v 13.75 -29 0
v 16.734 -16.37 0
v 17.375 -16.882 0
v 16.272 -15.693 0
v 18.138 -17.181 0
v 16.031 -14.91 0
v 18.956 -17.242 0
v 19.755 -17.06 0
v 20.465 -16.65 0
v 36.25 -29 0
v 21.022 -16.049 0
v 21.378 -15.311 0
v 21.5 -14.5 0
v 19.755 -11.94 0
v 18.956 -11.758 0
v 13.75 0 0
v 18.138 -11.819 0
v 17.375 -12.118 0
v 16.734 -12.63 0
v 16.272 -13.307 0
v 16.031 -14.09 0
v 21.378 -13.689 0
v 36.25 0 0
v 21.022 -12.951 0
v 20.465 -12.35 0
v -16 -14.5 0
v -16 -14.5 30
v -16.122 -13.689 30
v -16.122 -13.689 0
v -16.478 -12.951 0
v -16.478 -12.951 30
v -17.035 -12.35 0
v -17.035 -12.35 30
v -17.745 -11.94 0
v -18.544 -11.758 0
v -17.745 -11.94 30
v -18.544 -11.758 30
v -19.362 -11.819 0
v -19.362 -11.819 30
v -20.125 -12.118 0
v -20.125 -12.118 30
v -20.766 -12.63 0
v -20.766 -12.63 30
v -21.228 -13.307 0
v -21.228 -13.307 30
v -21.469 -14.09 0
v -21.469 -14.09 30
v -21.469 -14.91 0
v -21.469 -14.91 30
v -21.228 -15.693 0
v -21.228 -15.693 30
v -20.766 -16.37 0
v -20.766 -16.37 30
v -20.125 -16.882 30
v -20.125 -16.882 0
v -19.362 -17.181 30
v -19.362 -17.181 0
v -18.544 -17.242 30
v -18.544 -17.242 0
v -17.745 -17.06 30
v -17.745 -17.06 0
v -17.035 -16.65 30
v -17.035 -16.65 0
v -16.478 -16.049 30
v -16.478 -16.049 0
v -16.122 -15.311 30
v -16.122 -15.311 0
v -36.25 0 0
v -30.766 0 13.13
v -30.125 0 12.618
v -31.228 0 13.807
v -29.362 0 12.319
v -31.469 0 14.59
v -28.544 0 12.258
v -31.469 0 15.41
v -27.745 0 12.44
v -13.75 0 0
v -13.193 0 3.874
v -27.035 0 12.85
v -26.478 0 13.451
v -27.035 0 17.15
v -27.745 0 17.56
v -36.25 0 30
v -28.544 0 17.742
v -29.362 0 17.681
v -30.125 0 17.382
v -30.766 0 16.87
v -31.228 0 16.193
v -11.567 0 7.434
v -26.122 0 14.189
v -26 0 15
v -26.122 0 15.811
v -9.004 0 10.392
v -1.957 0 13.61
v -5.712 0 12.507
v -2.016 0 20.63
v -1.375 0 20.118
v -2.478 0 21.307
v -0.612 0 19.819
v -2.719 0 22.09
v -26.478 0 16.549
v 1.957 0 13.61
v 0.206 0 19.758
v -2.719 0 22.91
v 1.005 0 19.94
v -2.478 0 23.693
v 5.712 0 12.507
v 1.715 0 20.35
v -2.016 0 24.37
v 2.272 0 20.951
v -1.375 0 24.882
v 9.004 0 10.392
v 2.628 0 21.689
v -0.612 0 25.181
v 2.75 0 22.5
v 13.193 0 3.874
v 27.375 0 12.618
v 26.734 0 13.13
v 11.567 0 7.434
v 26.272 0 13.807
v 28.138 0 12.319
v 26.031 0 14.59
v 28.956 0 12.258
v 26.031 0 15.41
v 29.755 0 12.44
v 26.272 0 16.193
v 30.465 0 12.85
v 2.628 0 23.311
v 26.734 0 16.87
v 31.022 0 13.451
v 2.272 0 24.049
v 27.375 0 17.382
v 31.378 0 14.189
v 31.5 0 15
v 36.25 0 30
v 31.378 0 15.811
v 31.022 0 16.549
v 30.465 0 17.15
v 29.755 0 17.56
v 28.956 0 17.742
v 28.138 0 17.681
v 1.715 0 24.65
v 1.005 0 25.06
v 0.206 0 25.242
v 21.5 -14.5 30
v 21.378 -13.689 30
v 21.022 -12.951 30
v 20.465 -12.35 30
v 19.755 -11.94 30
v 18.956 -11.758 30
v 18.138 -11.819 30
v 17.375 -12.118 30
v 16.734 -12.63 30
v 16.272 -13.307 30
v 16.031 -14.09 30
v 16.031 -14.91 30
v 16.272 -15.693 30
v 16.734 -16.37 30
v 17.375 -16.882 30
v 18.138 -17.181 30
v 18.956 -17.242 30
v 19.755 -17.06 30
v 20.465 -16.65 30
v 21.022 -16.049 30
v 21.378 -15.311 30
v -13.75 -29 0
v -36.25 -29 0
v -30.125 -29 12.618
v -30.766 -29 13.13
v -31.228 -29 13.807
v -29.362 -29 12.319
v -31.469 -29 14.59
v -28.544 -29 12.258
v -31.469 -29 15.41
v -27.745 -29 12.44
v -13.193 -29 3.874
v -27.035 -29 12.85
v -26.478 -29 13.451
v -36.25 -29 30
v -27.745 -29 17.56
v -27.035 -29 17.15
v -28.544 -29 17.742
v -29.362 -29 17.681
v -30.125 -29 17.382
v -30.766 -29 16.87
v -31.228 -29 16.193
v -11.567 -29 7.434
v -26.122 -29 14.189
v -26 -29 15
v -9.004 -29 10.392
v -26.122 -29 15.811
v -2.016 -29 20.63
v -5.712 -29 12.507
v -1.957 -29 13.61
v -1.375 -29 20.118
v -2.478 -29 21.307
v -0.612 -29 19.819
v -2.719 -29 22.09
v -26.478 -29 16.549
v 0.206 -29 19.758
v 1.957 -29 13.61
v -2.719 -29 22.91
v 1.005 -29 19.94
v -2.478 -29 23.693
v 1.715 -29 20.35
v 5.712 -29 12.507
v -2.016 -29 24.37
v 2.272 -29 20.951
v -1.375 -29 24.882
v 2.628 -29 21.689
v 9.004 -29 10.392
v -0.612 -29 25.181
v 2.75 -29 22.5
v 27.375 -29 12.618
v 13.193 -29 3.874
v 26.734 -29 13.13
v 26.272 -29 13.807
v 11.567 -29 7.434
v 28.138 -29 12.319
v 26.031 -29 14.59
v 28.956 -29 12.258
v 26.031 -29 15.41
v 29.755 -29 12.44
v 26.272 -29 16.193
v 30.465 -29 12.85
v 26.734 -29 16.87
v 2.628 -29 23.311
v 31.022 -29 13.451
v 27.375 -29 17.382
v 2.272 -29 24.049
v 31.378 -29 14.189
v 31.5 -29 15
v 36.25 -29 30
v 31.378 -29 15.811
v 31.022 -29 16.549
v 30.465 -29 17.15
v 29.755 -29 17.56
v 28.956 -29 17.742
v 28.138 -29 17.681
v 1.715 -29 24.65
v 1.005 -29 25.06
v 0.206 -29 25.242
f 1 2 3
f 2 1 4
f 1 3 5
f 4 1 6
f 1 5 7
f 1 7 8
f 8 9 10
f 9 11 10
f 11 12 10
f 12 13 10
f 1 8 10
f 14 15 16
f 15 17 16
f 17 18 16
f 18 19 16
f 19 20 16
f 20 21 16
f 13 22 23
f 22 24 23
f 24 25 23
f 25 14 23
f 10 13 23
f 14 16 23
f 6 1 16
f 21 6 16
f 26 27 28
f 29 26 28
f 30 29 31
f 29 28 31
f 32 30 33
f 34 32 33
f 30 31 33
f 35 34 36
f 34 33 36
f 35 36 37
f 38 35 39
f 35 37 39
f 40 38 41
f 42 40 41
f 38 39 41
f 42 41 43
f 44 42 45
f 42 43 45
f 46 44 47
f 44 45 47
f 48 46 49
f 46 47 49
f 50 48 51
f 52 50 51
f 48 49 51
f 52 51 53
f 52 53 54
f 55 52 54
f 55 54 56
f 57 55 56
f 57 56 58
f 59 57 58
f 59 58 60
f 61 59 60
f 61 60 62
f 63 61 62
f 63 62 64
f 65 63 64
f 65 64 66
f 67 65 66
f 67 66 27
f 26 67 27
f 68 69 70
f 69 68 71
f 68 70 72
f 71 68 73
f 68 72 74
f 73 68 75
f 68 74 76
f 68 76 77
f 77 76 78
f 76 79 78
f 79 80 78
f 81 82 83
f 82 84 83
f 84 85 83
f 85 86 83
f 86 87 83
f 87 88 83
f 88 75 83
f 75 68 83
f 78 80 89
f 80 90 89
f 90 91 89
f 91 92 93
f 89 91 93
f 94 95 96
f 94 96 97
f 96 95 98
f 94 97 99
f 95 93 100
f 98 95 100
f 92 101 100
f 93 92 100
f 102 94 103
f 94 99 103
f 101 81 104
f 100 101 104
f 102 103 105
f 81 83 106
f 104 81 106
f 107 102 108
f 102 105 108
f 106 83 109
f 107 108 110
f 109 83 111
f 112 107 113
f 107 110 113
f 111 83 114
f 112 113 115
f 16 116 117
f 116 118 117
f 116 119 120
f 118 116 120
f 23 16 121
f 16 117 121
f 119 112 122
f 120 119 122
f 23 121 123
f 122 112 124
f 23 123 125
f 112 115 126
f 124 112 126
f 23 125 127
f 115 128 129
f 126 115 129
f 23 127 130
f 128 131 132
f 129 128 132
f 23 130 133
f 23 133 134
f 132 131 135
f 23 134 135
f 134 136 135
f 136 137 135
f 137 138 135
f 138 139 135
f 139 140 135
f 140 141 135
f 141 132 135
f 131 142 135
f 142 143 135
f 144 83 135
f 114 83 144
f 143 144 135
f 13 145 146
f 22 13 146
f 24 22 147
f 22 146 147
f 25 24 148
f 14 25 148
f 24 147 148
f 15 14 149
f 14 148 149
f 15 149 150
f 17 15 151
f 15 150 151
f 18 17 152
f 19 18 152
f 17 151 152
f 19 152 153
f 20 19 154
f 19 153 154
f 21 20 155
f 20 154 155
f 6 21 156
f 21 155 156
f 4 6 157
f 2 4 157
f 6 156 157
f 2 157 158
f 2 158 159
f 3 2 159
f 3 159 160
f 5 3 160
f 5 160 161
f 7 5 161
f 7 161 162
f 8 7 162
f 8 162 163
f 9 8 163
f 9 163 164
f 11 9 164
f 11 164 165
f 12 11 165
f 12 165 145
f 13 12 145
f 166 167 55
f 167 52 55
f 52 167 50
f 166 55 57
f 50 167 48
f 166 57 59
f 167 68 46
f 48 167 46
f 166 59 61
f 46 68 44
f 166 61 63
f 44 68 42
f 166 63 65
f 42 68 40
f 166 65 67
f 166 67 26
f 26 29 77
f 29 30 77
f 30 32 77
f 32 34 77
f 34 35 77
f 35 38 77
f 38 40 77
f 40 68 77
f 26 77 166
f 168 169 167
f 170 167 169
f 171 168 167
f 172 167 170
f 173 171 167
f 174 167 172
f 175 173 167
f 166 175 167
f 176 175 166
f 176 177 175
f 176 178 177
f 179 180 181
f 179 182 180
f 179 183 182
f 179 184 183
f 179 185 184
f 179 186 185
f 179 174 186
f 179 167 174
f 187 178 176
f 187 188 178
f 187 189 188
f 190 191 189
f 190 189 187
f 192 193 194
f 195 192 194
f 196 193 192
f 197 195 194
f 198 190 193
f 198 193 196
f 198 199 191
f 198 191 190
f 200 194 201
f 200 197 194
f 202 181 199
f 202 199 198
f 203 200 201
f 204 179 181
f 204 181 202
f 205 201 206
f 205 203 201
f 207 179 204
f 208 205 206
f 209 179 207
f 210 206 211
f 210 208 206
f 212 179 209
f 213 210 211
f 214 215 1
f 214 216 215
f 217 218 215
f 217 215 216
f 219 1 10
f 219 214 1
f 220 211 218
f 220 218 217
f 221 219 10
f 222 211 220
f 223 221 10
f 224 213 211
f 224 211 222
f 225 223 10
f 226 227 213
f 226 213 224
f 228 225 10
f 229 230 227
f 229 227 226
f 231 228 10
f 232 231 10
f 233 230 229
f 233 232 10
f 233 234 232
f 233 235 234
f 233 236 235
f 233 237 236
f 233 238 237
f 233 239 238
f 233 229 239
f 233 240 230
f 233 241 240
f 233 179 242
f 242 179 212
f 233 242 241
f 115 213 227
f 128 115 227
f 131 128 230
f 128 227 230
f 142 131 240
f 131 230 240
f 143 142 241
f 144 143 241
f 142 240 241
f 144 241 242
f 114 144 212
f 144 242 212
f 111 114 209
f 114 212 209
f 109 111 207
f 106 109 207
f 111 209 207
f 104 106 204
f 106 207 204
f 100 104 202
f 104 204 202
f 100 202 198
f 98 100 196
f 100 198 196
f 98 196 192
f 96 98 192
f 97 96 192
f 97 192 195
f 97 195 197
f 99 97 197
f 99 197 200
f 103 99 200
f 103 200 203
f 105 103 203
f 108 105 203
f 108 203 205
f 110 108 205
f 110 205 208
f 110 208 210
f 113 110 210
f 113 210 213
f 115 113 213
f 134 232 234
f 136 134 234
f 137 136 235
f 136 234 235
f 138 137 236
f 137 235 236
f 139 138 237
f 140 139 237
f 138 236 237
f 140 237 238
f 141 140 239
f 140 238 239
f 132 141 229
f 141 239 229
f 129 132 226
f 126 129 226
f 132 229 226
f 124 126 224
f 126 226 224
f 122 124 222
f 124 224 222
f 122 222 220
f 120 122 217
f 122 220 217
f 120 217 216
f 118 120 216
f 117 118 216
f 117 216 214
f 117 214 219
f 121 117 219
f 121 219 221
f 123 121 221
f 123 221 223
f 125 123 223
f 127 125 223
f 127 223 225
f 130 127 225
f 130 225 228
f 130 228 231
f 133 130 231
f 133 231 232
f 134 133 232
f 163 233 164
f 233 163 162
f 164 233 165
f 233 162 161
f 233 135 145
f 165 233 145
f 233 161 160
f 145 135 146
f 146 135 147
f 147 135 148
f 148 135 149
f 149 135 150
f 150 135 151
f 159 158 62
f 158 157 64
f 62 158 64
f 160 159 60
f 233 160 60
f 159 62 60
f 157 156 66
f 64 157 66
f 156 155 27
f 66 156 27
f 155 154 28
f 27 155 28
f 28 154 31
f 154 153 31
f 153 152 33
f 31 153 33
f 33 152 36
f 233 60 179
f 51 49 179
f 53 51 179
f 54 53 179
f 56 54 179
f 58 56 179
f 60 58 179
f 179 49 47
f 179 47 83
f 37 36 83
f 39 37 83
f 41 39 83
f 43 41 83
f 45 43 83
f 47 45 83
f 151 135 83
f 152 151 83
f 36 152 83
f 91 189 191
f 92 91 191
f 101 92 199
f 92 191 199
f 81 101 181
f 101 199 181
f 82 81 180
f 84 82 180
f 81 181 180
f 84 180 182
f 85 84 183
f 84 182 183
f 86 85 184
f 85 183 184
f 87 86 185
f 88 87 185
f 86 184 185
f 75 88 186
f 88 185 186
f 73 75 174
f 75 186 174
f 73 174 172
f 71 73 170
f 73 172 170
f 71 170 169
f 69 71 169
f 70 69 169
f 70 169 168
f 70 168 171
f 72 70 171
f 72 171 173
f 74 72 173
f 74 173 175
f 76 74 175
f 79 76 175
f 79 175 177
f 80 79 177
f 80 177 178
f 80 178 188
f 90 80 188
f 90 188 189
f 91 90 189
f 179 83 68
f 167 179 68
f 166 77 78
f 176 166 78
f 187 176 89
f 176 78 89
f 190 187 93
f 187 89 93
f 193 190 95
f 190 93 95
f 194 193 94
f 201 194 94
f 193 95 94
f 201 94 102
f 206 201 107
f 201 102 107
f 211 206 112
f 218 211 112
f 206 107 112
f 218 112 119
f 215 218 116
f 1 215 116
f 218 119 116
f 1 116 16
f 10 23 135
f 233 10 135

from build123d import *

# Parameters (mm, degrees)
F1_DEPTH = 29
F2_R     = 2.75
F3_DEPTH = 50
F4_R     = 2.75
F5_DEPTH = 50


with BuildPart() as f1:
    # F0 (on Front) → F1 (new body)
    with BuildSketch(Plane.XZ):
        with BuildLine():
            ThreePointArc((-13.75, 0), (0, 13.75), (13.75, 0))
            Line((13.75, 0), (36.25, 0))
            Line((36.25, 0), (36.25, 30))
            Line((36.25, 30), (-36.25, 30))
            Line((-36.25, 30), (-36.25, 0))
            Line((-36.25, 0), (-13.75, 0))
        make_face()
    extrude(amount=F1_DEPTH)

    # F2 (on face) → F3 (cut)
    with BuildSketch(Plane.XY.offset(30)):
        with Locations((-18.75, -14.5)):
            Circle(F2_R)
        with Locations((18.75, -14.5)):
            Circle(F2_R)
    extrude(amount=-F3_DEPTH, mode=Mode.SUBTRACT)

    # F4 (on face) → F5 (cut)
    with BuildSketch(Plane.XZ.offset(29)):
        with Locations((-28.75, 15)):
            Circle(F4_R)
        with Locations((0, 22.5)):
            Circle(F4_R)
        with Locations((28.75, 15)):
            Circle(F4_R)
    extrude(amount=-F5_DEPTH, mode=Mode.SUBTRACT)


solid = f1.part
